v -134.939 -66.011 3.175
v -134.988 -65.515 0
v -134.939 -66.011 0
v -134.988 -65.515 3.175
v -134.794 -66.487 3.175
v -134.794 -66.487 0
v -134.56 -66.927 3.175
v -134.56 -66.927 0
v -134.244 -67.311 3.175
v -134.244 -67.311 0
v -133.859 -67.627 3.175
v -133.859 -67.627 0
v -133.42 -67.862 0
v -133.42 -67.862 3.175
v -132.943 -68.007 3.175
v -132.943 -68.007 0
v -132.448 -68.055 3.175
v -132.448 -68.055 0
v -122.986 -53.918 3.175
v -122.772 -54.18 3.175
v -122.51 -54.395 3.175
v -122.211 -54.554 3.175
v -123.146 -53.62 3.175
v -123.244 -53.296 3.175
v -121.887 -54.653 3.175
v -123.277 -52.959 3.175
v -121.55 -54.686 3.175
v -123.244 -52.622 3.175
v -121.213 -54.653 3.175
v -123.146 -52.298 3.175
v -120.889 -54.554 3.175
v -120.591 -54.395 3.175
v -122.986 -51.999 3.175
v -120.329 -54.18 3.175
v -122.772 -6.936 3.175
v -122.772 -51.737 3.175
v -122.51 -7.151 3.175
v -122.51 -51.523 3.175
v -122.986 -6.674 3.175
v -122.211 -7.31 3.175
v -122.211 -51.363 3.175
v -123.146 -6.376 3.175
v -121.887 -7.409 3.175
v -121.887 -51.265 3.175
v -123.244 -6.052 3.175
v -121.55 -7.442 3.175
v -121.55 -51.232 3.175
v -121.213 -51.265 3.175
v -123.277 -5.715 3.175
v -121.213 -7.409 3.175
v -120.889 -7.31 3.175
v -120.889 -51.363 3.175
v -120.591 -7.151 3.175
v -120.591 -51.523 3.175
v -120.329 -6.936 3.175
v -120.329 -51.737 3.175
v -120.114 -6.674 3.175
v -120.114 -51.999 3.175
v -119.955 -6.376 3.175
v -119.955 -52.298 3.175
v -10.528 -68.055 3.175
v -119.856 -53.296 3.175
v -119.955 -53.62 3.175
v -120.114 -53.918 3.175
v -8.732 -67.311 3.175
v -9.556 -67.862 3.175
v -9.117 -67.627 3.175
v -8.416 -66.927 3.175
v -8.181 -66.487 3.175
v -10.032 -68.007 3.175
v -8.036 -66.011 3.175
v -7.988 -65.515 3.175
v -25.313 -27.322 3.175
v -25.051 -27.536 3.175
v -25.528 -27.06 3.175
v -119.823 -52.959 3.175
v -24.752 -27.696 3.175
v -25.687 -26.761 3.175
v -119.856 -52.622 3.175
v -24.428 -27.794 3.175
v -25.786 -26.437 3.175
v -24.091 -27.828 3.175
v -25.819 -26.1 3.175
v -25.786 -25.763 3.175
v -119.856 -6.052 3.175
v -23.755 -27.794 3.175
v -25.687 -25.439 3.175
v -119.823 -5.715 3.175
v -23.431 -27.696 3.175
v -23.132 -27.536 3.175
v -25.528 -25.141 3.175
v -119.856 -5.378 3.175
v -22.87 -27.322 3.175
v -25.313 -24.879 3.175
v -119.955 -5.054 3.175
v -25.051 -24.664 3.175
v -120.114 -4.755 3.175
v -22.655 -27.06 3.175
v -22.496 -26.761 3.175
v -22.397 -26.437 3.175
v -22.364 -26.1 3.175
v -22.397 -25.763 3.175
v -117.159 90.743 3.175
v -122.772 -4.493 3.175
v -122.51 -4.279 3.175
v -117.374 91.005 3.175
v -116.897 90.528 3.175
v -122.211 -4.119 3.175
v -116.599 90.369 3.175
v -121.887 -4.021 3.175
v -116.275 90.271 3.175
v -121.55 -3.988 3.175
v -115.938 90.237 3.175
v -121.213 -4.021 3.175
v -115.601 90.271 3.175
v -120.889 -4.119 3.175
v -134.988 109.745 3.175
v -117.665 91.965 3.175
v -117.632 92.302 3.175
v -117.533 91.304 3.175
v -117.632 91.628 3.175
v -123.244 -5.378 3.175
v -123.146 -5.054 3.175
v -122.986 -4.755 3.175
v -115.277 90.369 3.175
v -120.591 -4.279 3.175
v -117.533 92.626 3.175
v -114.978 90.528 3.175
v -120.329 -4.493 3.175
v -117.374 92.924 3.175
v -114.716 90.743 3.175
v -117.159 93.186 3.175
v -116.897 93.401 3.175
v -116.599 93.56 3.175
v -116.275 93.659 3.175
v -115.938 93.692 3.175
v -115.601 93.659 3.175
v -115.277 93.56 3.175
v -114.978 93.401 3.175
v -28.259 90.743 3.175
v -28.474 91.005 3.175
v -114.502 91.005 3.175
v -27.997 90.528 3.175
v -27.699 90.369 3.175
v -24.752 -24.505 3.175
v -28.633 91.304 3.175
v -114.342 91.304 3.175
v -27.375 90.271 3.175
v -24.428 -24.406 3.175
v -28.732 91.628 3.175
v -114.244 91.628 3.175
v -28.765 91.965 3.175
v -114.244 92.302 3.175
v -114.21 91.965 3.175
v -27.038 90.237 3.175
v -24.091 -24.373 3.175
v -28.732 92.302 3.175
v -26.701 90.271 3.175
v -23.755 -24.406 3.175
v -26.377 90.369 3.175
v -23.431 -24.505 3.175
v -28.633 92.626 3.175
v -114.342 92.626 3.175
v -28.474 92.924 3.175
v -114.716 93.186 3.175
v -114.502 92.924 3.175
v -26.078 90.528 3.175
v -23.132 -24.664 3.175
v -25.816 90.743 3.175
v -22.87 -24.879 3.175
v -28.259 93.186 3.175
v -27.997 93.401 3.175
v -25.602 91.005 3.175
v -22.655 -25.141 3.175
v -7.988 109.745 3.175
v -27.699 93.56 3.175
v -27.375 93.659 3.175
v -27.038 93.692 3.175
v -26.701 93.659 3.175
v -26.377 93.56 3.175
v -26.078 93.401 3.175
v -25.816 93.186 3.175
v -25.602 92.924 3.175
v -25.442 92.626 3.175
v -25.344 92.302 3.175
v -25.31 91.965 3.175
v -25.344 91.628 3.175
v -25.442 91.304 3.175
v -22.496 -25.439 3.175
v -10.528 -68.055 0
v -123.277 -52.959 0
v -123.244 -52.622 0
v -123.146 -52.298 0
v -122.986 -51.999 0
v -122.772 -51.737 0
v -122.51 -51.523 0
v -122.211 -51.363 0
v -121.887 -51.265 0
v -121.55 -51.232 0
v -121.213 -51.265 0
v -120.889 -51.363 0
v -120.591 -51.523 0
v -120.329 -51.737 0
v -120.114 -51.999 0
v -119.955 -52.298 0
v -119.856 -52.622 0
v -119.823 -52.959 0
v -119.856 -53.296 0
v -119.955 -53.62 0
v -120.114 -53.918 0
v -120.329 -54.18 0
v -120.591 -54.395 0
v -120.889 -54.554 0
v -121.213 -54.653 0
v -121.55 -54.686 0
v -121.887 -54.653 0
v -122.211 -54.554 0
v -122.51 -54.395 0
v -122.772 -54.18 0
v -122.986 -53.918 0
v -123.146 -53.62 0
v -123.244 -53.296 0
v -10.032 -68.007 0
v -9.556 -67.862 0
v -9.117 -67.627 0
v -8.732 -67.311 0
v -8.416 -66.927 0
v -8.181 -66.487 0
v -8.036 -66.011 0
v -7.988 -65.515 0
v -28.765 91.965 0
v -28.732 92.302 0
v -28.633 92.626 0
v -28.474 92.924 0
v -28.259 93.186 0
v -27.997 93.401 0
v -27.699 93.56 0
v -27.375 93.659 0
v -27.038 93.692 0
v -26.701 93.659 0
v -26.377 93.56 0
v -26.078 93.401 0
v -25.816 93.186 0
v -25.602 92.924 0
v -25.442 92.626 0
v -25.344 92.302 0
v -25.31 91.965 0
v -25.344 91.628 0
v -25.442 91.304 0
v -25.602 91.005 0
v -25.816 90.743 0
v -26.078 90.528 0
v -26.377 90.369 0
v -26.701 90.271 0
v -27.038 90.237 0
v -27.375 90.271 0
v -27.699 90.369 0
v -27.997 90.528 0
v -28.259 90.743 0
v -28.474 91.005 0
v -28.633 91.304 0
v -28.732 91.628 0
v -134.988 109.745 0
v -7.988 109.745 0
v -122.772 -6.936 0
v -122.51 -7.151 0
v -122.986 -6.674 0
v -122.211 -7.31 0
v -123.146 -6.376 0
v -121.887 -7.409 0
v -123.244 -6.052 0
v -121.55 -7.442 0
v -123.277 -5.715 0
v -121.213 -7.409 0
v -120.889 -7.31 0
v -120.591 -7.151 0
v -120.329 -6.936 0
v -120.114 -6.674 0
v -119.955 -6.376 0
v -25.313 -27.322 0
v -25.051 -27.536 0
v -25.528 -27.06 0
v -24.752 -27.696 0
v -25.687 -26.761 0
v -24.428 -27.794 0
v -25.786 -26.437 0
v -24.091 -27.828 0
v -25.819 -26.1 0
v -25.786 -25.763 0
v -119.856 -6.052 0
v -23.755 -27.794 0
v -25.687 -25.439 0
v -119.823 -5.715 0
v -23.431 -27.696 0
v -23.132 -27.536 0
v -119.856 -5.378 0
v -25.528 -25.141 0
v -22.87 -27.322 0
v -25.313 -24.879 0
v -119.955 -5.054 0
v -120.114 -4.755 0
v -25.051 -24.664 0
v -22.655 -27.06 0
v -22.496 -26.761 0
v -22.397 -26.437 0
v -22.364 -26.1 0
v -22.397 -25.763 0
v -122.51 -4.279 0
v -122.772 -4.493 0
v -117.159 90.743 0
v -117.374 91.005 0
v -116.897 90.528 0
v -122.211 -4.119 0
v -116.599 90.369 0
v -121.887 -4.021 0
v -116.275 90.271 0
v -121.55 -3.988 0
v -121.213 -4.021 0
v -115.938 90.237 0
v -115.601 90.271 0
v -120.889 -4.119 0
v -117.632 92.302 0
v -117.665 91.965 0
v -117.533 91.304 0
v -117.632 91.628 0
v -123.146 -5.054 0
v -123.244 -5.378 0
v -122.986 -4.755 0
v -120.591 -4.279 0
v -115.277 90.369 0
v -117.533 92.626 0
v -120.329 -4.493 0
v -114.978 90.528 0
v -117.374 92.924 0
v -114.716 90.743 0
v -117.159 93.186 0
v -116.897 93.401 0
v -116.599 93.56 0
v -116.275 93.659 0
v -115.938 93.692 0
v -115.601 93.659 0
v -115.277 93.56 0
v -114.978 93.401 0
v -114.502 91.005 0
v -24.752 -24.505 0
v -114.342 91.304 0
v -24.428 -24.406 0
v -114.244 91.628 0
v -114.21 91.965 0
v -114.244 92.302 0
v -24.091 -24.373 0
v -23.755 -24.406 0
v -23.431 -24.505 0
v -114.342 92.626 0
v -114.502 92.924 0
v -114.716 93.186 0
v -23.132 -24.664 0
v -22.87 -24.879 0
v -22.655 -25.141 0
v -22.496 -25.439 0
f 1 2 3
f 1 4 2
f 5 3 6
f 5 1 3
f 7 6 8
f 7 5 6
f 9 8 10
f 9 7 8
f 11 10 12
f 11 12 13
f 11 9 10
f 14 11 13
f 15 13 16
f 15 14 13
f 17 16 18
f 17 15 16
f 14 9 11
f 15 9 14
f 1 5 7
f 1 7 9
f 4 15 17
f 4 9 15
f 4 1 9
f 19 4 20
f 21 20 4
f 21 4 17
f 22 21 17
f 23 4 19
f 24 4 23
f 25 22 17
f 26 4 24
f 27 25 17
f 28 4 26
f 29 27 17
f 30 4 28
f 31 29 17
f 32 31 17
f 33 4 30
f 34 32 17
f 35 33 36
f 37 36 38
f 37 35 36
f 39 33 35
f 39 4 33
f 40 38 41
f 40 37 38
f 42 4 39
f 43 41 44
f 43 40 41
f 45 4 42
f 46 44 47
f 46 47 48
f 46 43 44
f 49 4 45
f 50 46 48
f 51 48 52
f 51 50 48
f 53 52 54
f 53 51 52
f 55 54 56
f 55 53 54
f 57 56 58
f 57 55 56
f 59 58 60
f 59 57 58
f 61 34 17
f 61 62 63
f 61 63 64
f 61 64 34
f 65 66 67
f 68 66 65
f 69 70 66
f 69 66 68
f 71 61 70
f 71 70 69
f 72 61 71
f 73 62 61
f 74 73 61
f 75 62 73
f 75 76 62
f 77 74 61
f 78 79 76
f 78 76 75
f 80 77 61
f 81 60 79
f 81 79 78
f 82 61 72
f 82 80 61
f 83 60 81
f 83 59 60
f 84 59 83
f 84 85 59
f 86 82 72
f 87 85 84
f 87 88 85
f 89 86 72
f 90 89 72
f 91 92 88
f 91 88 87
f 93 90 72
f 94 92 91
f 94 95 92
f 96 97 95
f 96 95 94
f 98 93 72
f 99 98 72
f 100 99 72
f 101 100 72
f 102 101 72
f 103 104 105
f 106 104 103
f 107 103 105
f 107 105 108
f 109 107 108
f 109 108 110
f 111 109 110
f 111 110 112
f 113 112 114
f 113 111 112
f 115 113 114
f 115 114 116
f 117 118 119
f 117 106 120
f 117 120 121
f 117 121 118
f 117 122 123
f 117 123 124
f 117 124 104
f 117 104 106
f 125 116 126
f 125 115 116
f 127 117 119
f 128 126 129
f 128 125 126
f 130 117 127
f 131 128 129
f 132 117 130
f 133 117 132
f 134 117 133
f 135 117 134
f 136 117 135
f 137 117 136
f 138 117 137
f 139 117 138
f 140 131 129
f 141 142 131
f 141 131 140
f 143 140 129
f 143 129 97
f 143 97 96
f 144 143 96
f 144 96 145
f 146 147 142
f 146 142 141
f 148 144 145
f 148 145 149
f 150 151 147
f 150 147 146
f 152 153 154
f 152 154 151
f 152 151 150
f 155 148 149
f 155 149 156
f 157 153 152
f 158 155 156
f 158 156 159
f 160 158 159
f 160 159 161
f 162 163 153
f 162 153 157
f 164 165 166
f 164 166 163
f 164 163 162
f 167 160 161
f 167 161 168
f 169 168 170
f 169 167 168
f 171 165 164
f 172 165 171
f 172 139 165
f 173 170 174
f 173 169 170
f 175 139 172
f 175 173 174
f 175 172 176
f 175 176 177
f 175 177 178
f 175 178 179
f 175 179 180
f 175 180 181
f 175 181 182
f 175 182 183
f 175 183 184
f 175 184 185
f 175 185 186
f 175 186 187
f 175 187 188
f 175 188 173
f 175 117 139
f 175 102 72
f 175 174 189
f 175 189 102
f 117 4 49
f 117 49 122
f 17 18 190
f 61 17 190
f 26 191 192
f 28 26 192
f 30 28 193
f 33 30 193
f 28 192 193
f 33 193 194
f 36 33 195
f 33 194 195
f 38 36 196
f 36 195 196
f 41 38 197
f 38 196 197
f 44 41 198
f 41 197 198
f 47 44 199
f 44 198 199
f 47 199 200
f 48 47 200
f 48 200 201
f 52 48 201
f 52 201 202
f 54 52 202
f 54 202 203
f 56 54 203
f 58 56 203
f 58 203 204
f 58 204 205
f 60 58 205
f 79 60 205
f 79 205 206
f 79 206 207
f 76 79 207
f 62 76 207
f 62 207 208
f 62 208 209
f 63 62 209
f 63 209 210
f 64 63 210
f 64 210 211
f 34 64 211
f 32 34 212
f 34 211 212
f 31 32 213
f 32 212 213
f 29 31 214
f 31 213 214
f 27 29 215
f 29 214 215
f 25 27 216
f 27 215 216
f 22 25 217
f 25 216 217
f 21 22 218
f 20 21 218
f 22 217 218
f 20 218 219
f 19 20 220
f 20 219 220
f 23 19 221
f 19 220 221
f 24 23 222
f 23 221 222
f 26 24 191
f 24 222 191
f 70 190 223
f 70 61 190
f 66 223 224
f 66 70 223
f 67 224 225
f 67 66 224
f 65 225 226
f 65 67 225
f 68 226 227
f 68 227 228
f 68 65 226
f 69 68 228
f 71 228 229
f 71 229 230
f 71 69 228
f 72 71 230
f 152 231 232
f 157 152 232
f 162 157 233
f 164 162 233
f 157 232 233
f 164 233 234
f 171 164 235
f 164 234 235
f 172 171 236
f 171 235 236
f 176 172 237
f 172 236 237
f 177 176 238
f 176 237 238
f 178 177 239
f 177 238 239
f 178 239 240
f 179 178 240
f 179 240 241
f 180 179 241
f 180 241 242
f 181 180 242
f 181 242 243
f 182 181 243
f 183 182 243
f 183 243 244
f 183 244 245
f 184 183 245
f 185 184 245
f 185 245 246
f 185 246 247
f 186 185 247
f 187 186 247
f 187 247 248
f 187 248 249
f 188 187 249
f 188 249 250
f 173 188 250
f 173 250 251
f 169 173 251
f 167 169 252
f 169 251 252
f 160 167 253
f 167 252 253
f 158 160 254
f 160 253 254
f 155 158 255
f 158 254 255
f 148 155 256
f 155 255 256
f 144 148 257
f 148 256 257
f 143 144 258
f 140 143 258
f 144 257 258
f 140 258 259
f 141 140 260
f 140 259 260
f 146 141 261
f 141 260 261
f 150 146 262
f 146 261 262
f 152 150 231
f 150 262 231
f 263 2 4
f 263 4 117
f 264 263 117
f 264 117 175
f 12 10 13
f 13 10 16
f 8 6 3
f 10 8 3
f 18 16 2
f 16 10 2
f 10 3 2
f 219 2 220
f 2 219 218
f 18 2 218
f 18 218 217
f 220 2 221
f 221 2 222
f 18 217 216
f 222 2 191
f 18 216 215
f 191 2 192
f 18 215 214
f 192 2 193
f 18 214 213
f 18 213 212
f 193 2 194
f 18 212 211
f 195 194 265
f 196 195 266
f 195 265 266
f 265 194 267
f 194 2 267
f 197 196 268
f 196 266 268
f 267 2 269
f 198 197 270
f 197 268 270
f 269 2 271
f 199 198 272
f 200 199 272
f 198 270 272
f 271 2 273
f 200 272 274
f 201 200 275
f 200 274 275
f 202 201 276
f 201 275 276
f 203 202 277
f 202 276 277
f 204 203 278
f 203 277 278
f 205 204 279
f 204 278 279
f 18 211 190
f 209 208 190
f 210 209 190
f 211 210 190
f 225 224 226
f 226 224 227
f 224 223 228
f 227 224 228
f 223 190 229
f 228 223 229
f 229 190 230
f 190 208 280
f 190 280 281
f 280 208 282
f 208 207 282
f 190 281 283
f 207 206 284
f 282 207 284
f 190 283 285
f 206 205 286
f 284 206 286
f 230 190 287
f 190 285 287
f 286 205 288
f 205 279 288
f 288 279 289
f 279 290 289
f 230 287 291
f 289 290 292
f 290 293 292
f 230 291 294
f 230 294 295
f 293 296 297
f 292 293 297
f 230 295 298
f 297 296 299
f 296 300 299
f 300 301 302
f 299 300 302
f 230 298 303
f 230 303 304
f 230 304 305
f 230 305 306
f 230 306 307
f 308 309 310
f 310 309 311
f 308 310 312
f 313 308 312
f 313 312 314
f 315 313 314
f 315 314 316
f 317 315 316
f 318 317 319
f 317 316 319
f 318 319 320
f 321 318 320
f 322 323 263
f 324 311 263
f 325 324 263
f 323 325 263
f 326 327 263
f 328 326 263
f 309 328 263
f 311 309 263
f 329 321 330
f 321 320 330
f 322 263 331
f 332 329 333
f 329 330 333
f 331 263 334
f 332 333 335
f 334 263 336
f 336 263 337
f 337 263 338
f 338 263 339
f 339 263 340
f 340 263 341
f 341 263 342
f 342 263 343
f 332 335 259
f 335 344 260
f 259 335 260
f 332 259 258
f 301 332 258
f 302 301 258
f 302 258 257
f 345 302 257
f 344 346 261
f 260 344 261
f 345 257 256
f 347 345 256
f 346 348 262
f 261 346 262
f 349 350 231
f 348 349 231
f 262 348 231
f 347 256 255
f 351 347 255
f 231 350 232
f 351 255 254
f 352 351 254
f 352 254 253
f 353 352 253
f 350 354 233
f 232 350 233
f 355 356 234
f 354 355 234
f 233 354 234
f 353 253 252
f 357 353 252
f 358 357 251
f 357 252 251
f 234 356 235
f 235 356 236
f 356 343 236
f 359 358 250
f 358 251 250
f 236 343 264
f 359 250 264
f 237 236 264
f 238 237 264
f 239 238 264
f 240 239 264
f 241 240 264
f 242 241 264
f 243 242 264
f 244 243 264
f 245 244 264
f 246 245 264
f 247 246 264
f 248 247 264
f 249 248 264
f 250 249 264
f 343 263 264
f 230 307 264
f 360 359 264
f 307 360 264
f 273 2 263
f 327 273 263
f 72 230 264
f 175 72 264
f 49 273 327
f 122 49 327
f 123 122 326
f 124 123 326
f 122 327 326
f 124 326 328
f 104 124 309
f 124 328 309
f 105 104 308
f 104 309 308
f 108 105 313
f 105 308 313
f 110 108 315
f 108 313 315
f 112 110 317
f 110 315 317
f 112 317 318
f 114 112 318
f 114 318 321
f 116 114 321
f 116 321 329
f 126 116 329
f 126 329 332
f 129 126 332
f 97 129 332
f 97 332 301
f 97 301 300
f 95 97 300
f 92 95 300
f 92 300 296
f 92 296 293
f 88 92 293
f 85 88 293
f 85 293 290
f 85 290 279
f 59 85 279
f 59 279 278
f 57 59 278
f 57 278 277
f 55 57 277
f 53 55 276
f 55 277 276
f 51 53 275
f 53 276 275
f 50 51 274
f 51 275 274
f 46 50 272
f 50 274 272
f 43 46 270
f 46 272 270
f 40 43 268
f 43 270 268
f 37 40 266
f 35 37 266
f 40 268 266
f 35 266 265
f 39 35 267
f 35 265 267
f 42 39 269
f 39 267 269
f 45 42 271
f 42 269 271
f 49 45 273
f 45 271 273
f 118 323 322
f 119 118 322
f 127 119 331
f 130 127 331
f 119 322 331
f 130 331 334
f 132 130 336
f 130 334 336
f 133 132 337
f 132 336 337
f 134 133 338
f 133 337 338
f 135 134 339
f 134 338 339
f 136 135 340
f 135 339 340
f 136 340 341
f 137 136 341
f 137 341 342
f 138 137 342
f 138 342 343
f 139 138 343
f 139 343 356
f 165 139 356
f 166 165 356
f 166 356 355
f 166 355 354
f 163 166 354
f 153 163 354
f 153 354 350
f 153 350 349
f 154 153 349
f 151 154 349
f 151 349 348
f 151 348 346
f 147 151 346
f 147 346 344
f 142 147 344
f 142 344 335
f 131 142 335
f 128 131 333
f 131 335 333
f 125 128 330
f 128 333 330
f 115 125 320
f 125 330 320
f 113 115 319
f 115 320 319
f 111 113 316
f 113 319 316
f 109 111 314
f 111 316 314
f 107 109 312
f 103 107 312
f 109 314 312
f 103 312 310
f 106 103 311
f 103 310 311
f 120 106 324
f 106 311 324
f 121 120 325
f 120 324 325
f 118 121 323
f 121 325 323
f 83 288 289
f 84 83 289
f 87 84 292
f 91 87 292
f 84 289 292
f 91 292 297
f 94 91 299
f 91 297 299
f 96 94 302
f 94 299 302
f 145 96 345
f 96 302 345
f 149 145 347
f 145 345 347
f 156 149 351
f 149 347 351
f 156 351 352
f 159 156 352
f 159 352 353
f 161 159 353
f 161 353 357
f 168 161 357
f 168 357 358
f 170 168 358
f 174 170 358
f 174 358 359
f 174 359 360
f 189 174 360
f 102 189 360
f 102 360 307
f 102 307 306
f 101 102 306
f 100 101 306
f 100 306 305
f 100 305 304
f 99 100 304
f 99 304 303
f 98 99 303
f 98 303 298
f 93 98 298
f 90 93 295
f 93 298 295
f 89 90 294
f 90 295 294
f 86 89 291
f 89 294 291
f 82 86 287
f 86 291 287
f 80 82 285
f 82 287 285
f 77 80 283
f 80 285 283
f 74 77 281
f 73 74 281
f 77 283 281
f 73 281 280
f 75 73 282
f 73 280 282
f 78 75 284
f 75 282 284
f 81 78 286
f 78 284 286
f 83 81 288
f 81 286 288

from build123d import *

# Parameters (mm, degrees)
SKETCH1_W                   = 127
SKETCH1_H                   = 177.8
BOSS_EXTRUDE1_DEPTH         = 3.175
F_29_0_136_DIAMETER_HOLE1_D = 3.4544
FILLET1_R                   = 2.54
TAP_DRILL_FOR_8_32_TAP1_D   = 3.4544


with BuildPart() as part:
    # Sketch1 → Boss-Extrude1 (new body)
    with BuildSketch(Plane.XY):
        with Locations((-71.487671776, 20.844565217)):
            Rectangle(SKETCH1_W, SKETCH1_H)
    extrude(amount=BOSS_EXTRUDE1_DEPTH)

    # #29 (0.136) Diameter Hole1 (through all)
    with Locations(Plane.XY.offset(3.175)):
        with Locations((-27.037671776, 91.964565217), (-115.937671776, 91.964565217)):
            Hole(F_29_0_136_DIAMETER_HOLE1_D / 2)

    # Fillet1
    fillet1_edges = [part.edges().sort_by_distance(p)[0] for p in [
        (-7.987671776, -68.055434783, 1.5875),
        (-134.987671776, -68.055434783, 1.5875),
    ]]
    fillet(fillet1_edges, radius=FILLET1_R)

    # Tap Drill for #8-32 Tap1 (through all)
    with Locations(Plane.XY.offset(3.175)):
        with Locations((-121.550284352, -52.958757681), (-121.550284352, -5.714757681), (-24.091492851, -26.100306068)):
            Hole(TAP_DRILL_FOR_8_32_TAP1_D / 2)


solid = part.part
